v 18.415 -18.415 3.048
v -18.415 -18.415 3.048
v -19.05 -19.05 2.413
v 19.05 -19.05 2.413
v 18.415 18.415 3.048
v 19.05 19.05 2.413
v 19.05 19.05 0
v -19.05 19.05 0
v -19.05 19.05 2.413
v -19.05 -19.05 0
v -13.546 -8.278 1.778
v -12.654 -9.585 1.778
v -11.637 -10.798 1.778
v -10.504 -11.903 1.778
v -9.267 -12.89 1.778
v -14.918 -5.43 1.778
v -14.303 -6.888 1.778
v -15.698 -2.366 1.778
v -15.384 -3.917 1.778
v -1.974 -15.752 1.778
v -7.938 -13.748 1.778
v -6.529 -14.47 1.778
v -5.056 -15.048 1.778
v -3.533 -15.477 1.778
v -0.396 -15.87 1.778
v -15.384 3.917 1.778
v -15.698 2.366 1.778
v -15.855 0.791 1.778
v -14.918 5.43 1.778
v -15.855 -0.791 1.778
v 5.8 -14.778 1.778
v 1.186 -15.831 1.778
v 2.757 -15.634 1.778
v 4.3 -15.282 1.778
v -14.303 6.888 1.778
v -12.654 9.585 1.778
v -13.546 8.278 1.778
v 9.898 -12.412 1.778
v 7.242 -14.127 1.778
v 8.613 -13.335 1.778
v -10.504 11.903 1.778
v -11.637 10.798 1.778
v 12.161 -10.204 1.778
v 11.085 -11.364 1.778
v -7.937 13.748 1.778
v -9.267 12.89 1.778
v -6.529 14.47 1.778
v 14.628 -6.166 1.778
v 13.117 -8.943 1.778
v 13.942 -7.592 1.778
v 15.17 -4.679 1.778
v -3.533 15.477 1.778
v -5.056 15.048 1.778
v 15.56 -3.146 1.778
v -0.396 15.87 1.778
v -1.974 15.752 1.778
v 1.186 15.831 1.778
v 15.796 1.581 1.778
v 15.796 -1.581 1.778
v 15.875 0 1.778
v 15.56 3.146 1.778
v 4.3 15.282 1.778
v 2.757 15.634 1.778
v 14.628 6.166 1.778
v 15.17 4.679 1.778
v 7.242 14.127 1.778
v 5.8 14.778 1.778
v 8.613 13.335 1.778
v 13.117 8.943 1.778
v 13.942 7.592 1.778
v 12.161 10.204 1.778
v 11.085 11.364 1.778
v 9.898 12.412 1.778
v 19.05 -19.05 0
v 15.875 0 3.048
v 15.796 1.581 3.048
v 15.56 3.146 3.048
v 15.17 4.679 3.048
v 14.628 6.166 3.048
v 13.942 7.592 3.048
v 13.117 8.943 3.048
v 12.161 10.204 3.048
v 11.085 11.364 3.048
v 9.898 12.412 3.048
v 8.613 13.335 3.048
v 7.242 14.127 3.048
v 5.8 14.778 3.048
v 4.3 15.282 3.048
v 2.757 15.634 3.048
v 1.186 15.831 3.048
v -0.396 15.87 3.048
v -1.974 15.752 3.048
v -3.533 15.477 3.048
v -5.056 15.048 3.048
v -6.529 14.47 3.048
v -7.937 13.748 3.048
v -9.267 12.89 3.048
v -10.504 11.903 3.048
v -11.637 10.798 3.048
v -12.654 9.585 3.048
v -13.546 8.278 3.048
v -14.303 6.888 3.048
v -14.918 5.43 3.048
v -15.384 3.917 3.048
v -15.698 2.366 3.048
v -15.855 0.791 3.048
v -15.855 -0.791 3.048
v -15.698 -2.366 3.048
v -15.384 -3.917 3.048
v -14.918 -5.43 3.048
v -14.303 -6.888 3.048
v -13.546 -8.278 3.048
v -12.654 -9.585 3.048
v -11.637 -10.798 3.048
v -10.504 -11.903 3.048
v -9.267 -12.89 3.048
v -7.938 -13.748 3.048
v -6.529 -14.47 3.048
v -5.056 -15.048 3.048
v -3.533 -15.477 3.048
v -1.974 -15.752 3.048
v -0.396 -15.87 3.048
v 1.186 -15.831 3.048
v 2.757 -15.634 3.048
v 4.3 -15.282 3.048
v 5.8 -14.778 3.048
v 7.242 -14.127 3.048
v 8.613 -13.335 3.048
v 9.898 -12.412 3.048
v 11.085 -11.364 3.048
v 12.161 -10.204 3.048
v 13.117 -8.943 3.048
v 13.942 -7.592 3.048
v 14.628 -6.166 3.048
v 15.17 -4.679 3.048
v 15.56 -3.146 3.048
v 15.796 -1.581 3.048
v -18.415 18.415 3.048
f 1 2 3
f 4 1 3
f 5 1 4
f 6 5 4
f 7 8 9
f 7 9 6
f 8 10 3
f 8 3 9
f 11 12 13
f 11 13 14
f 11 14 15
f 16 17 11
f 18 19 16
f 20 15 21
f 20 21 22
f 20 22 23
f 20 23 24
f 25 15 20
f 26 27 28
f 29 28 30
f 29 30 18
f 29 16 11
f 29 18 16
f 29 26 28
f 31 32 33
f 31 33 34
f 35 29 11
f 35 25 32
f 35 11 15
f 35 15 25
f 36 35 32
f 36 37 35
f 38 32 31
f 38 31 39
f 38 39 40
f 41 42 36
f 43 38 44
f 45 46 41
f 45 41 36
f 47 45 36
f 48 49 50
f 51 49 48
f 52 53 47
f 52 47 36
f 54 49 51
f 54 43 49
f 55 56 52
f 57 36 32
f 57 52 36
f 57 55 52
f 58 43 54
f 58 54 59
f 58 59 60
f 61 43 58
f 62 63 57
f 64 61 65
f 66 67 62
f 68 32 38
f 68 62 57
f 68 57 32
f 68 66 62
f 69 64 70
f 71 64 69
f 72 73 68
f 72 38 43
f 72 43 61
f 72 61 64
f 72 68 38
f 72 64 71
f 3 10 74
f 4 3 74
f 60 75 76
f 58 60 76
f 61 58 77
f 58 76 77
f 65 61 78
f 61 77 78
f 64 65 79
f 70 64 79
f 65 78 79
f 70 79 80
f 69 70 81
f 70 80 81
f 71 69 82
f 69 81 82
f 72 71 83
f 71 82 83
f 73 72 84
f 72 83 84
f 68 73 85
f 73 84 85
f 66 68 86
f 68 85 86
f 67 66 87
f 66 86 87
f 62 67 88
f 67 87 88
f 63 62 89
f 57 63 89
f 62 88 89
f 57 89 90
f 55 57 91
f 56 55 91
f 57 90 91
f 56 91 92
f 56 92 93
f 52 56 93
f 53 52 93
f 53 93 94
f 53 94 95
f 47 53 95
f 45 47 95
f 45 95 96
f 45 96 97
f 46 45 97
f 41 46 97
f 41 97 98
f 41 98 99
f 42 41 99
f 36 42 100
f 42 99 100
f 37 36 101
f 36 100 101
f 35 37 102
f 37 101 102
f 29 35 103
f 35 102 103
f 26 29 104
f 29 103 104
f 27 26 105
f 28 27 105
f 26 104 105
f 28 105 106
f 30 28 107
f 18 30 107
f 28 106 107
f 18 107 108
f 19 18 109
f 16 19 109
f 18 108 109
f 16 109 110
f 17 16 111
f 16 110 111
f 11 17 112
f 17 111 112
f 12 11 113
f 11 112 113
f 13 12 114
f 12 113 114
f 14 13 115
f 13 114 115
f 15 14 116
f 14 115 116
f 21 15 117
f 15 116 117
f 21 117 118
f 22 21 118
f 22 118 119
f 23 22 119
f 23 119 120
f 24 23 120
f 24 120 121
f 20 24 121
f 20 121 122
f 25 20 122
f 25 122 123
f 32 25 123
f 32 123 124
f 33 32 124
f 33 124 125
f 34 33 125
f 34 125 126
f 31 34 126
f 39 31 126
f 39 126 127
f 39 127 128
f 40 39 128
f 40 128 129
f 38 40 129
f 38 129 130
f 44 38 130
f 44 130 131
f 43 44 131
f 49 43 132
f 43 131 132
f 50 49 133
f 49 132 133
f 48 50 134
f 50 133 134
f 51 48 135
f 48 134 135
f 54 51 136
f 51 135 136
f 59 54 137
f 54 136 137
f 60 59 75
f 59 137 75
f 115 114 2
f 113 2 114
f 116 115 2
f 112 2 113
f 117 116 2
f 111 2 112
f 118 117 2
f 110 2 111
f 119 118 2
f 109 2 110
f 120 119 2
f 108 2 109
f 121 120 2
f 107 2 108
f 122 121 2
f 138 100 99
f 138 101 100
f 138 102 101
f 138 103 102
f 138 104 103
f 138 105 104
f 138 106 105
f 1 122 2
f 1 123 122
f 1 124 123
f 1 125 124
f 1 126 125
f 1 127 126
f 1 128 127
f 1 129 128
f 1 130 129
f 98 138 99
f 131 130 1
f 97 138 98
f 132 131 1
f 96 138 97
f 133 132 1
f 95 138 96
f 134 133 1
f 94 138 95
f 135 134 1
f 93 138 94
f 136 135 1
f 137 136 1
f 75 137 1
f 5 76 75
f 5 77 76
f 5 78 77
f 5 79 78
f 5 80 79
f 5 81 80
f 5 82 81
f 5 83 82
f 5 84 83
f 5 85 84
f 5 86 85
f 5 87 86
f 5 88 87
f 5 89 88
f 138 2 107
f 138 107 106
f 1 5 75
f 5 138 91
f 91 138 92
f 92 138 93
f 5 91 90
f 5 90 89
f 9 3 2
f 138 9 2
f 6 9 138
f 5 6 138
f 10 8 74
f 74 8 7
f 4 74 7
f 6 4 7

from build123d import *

# Parameters (mm, degrees)
F0_W     = 38.1
F0_H     = 38.1
F1_DEPTH = 3.048
F2_R     = 15.875
F3_DEPTH = 1.27
F5_DEPTH = 38.101
F7_DEPTH = 38.101


with BuildPart() as f1:
    # F0 (on Top) → F1 (new body)
    with BuildSketch(Plane.XY):
        Rectangle(F0_W, F0_H)
    extrude(amount=F1_DEPTH)

    # F2 (on face) → F3 (cut)
    with BuildSketch(Plane.XY.offset(3.048)):
        Circle(F2_R)
    extrude(amount=-F3_DEPTH, mode=Mode.SUBTRACT)

    # F4 (on face) → F5 (cut, through all)
    with BuildSketch(Plane.XZ.offset(19.05)):
        Polygon((-18.415, 3.048), (-19.05, 3.048), (-19.05, 2.413), align=None)
        Polygon((19.05, 3.048), (18.415, 3.048), (19.05, 2.413), align=None)
    extrude(amount=-F5_DEPTH, mode=Mode.SUBTRACT)

    # F6 (on face) → F7 (cut, through all)
    with BuildSketch(Plane(origin=(-19.05, 0, 0), x_dir=(0, -1, 0), z_dir=(-1, 0, 0))):
        Polygon((-18.415, 3.048), (-19.05, 3.048), (-19.05, 2.413), align=None)
        Polygon((18.415, 3.048), (19.05, 2.413), (19.05, 3.048), align=None)
    extrude(amount=-F7_DEPTH, mode=Mode.SUBTRACT)


solid = f1.part
